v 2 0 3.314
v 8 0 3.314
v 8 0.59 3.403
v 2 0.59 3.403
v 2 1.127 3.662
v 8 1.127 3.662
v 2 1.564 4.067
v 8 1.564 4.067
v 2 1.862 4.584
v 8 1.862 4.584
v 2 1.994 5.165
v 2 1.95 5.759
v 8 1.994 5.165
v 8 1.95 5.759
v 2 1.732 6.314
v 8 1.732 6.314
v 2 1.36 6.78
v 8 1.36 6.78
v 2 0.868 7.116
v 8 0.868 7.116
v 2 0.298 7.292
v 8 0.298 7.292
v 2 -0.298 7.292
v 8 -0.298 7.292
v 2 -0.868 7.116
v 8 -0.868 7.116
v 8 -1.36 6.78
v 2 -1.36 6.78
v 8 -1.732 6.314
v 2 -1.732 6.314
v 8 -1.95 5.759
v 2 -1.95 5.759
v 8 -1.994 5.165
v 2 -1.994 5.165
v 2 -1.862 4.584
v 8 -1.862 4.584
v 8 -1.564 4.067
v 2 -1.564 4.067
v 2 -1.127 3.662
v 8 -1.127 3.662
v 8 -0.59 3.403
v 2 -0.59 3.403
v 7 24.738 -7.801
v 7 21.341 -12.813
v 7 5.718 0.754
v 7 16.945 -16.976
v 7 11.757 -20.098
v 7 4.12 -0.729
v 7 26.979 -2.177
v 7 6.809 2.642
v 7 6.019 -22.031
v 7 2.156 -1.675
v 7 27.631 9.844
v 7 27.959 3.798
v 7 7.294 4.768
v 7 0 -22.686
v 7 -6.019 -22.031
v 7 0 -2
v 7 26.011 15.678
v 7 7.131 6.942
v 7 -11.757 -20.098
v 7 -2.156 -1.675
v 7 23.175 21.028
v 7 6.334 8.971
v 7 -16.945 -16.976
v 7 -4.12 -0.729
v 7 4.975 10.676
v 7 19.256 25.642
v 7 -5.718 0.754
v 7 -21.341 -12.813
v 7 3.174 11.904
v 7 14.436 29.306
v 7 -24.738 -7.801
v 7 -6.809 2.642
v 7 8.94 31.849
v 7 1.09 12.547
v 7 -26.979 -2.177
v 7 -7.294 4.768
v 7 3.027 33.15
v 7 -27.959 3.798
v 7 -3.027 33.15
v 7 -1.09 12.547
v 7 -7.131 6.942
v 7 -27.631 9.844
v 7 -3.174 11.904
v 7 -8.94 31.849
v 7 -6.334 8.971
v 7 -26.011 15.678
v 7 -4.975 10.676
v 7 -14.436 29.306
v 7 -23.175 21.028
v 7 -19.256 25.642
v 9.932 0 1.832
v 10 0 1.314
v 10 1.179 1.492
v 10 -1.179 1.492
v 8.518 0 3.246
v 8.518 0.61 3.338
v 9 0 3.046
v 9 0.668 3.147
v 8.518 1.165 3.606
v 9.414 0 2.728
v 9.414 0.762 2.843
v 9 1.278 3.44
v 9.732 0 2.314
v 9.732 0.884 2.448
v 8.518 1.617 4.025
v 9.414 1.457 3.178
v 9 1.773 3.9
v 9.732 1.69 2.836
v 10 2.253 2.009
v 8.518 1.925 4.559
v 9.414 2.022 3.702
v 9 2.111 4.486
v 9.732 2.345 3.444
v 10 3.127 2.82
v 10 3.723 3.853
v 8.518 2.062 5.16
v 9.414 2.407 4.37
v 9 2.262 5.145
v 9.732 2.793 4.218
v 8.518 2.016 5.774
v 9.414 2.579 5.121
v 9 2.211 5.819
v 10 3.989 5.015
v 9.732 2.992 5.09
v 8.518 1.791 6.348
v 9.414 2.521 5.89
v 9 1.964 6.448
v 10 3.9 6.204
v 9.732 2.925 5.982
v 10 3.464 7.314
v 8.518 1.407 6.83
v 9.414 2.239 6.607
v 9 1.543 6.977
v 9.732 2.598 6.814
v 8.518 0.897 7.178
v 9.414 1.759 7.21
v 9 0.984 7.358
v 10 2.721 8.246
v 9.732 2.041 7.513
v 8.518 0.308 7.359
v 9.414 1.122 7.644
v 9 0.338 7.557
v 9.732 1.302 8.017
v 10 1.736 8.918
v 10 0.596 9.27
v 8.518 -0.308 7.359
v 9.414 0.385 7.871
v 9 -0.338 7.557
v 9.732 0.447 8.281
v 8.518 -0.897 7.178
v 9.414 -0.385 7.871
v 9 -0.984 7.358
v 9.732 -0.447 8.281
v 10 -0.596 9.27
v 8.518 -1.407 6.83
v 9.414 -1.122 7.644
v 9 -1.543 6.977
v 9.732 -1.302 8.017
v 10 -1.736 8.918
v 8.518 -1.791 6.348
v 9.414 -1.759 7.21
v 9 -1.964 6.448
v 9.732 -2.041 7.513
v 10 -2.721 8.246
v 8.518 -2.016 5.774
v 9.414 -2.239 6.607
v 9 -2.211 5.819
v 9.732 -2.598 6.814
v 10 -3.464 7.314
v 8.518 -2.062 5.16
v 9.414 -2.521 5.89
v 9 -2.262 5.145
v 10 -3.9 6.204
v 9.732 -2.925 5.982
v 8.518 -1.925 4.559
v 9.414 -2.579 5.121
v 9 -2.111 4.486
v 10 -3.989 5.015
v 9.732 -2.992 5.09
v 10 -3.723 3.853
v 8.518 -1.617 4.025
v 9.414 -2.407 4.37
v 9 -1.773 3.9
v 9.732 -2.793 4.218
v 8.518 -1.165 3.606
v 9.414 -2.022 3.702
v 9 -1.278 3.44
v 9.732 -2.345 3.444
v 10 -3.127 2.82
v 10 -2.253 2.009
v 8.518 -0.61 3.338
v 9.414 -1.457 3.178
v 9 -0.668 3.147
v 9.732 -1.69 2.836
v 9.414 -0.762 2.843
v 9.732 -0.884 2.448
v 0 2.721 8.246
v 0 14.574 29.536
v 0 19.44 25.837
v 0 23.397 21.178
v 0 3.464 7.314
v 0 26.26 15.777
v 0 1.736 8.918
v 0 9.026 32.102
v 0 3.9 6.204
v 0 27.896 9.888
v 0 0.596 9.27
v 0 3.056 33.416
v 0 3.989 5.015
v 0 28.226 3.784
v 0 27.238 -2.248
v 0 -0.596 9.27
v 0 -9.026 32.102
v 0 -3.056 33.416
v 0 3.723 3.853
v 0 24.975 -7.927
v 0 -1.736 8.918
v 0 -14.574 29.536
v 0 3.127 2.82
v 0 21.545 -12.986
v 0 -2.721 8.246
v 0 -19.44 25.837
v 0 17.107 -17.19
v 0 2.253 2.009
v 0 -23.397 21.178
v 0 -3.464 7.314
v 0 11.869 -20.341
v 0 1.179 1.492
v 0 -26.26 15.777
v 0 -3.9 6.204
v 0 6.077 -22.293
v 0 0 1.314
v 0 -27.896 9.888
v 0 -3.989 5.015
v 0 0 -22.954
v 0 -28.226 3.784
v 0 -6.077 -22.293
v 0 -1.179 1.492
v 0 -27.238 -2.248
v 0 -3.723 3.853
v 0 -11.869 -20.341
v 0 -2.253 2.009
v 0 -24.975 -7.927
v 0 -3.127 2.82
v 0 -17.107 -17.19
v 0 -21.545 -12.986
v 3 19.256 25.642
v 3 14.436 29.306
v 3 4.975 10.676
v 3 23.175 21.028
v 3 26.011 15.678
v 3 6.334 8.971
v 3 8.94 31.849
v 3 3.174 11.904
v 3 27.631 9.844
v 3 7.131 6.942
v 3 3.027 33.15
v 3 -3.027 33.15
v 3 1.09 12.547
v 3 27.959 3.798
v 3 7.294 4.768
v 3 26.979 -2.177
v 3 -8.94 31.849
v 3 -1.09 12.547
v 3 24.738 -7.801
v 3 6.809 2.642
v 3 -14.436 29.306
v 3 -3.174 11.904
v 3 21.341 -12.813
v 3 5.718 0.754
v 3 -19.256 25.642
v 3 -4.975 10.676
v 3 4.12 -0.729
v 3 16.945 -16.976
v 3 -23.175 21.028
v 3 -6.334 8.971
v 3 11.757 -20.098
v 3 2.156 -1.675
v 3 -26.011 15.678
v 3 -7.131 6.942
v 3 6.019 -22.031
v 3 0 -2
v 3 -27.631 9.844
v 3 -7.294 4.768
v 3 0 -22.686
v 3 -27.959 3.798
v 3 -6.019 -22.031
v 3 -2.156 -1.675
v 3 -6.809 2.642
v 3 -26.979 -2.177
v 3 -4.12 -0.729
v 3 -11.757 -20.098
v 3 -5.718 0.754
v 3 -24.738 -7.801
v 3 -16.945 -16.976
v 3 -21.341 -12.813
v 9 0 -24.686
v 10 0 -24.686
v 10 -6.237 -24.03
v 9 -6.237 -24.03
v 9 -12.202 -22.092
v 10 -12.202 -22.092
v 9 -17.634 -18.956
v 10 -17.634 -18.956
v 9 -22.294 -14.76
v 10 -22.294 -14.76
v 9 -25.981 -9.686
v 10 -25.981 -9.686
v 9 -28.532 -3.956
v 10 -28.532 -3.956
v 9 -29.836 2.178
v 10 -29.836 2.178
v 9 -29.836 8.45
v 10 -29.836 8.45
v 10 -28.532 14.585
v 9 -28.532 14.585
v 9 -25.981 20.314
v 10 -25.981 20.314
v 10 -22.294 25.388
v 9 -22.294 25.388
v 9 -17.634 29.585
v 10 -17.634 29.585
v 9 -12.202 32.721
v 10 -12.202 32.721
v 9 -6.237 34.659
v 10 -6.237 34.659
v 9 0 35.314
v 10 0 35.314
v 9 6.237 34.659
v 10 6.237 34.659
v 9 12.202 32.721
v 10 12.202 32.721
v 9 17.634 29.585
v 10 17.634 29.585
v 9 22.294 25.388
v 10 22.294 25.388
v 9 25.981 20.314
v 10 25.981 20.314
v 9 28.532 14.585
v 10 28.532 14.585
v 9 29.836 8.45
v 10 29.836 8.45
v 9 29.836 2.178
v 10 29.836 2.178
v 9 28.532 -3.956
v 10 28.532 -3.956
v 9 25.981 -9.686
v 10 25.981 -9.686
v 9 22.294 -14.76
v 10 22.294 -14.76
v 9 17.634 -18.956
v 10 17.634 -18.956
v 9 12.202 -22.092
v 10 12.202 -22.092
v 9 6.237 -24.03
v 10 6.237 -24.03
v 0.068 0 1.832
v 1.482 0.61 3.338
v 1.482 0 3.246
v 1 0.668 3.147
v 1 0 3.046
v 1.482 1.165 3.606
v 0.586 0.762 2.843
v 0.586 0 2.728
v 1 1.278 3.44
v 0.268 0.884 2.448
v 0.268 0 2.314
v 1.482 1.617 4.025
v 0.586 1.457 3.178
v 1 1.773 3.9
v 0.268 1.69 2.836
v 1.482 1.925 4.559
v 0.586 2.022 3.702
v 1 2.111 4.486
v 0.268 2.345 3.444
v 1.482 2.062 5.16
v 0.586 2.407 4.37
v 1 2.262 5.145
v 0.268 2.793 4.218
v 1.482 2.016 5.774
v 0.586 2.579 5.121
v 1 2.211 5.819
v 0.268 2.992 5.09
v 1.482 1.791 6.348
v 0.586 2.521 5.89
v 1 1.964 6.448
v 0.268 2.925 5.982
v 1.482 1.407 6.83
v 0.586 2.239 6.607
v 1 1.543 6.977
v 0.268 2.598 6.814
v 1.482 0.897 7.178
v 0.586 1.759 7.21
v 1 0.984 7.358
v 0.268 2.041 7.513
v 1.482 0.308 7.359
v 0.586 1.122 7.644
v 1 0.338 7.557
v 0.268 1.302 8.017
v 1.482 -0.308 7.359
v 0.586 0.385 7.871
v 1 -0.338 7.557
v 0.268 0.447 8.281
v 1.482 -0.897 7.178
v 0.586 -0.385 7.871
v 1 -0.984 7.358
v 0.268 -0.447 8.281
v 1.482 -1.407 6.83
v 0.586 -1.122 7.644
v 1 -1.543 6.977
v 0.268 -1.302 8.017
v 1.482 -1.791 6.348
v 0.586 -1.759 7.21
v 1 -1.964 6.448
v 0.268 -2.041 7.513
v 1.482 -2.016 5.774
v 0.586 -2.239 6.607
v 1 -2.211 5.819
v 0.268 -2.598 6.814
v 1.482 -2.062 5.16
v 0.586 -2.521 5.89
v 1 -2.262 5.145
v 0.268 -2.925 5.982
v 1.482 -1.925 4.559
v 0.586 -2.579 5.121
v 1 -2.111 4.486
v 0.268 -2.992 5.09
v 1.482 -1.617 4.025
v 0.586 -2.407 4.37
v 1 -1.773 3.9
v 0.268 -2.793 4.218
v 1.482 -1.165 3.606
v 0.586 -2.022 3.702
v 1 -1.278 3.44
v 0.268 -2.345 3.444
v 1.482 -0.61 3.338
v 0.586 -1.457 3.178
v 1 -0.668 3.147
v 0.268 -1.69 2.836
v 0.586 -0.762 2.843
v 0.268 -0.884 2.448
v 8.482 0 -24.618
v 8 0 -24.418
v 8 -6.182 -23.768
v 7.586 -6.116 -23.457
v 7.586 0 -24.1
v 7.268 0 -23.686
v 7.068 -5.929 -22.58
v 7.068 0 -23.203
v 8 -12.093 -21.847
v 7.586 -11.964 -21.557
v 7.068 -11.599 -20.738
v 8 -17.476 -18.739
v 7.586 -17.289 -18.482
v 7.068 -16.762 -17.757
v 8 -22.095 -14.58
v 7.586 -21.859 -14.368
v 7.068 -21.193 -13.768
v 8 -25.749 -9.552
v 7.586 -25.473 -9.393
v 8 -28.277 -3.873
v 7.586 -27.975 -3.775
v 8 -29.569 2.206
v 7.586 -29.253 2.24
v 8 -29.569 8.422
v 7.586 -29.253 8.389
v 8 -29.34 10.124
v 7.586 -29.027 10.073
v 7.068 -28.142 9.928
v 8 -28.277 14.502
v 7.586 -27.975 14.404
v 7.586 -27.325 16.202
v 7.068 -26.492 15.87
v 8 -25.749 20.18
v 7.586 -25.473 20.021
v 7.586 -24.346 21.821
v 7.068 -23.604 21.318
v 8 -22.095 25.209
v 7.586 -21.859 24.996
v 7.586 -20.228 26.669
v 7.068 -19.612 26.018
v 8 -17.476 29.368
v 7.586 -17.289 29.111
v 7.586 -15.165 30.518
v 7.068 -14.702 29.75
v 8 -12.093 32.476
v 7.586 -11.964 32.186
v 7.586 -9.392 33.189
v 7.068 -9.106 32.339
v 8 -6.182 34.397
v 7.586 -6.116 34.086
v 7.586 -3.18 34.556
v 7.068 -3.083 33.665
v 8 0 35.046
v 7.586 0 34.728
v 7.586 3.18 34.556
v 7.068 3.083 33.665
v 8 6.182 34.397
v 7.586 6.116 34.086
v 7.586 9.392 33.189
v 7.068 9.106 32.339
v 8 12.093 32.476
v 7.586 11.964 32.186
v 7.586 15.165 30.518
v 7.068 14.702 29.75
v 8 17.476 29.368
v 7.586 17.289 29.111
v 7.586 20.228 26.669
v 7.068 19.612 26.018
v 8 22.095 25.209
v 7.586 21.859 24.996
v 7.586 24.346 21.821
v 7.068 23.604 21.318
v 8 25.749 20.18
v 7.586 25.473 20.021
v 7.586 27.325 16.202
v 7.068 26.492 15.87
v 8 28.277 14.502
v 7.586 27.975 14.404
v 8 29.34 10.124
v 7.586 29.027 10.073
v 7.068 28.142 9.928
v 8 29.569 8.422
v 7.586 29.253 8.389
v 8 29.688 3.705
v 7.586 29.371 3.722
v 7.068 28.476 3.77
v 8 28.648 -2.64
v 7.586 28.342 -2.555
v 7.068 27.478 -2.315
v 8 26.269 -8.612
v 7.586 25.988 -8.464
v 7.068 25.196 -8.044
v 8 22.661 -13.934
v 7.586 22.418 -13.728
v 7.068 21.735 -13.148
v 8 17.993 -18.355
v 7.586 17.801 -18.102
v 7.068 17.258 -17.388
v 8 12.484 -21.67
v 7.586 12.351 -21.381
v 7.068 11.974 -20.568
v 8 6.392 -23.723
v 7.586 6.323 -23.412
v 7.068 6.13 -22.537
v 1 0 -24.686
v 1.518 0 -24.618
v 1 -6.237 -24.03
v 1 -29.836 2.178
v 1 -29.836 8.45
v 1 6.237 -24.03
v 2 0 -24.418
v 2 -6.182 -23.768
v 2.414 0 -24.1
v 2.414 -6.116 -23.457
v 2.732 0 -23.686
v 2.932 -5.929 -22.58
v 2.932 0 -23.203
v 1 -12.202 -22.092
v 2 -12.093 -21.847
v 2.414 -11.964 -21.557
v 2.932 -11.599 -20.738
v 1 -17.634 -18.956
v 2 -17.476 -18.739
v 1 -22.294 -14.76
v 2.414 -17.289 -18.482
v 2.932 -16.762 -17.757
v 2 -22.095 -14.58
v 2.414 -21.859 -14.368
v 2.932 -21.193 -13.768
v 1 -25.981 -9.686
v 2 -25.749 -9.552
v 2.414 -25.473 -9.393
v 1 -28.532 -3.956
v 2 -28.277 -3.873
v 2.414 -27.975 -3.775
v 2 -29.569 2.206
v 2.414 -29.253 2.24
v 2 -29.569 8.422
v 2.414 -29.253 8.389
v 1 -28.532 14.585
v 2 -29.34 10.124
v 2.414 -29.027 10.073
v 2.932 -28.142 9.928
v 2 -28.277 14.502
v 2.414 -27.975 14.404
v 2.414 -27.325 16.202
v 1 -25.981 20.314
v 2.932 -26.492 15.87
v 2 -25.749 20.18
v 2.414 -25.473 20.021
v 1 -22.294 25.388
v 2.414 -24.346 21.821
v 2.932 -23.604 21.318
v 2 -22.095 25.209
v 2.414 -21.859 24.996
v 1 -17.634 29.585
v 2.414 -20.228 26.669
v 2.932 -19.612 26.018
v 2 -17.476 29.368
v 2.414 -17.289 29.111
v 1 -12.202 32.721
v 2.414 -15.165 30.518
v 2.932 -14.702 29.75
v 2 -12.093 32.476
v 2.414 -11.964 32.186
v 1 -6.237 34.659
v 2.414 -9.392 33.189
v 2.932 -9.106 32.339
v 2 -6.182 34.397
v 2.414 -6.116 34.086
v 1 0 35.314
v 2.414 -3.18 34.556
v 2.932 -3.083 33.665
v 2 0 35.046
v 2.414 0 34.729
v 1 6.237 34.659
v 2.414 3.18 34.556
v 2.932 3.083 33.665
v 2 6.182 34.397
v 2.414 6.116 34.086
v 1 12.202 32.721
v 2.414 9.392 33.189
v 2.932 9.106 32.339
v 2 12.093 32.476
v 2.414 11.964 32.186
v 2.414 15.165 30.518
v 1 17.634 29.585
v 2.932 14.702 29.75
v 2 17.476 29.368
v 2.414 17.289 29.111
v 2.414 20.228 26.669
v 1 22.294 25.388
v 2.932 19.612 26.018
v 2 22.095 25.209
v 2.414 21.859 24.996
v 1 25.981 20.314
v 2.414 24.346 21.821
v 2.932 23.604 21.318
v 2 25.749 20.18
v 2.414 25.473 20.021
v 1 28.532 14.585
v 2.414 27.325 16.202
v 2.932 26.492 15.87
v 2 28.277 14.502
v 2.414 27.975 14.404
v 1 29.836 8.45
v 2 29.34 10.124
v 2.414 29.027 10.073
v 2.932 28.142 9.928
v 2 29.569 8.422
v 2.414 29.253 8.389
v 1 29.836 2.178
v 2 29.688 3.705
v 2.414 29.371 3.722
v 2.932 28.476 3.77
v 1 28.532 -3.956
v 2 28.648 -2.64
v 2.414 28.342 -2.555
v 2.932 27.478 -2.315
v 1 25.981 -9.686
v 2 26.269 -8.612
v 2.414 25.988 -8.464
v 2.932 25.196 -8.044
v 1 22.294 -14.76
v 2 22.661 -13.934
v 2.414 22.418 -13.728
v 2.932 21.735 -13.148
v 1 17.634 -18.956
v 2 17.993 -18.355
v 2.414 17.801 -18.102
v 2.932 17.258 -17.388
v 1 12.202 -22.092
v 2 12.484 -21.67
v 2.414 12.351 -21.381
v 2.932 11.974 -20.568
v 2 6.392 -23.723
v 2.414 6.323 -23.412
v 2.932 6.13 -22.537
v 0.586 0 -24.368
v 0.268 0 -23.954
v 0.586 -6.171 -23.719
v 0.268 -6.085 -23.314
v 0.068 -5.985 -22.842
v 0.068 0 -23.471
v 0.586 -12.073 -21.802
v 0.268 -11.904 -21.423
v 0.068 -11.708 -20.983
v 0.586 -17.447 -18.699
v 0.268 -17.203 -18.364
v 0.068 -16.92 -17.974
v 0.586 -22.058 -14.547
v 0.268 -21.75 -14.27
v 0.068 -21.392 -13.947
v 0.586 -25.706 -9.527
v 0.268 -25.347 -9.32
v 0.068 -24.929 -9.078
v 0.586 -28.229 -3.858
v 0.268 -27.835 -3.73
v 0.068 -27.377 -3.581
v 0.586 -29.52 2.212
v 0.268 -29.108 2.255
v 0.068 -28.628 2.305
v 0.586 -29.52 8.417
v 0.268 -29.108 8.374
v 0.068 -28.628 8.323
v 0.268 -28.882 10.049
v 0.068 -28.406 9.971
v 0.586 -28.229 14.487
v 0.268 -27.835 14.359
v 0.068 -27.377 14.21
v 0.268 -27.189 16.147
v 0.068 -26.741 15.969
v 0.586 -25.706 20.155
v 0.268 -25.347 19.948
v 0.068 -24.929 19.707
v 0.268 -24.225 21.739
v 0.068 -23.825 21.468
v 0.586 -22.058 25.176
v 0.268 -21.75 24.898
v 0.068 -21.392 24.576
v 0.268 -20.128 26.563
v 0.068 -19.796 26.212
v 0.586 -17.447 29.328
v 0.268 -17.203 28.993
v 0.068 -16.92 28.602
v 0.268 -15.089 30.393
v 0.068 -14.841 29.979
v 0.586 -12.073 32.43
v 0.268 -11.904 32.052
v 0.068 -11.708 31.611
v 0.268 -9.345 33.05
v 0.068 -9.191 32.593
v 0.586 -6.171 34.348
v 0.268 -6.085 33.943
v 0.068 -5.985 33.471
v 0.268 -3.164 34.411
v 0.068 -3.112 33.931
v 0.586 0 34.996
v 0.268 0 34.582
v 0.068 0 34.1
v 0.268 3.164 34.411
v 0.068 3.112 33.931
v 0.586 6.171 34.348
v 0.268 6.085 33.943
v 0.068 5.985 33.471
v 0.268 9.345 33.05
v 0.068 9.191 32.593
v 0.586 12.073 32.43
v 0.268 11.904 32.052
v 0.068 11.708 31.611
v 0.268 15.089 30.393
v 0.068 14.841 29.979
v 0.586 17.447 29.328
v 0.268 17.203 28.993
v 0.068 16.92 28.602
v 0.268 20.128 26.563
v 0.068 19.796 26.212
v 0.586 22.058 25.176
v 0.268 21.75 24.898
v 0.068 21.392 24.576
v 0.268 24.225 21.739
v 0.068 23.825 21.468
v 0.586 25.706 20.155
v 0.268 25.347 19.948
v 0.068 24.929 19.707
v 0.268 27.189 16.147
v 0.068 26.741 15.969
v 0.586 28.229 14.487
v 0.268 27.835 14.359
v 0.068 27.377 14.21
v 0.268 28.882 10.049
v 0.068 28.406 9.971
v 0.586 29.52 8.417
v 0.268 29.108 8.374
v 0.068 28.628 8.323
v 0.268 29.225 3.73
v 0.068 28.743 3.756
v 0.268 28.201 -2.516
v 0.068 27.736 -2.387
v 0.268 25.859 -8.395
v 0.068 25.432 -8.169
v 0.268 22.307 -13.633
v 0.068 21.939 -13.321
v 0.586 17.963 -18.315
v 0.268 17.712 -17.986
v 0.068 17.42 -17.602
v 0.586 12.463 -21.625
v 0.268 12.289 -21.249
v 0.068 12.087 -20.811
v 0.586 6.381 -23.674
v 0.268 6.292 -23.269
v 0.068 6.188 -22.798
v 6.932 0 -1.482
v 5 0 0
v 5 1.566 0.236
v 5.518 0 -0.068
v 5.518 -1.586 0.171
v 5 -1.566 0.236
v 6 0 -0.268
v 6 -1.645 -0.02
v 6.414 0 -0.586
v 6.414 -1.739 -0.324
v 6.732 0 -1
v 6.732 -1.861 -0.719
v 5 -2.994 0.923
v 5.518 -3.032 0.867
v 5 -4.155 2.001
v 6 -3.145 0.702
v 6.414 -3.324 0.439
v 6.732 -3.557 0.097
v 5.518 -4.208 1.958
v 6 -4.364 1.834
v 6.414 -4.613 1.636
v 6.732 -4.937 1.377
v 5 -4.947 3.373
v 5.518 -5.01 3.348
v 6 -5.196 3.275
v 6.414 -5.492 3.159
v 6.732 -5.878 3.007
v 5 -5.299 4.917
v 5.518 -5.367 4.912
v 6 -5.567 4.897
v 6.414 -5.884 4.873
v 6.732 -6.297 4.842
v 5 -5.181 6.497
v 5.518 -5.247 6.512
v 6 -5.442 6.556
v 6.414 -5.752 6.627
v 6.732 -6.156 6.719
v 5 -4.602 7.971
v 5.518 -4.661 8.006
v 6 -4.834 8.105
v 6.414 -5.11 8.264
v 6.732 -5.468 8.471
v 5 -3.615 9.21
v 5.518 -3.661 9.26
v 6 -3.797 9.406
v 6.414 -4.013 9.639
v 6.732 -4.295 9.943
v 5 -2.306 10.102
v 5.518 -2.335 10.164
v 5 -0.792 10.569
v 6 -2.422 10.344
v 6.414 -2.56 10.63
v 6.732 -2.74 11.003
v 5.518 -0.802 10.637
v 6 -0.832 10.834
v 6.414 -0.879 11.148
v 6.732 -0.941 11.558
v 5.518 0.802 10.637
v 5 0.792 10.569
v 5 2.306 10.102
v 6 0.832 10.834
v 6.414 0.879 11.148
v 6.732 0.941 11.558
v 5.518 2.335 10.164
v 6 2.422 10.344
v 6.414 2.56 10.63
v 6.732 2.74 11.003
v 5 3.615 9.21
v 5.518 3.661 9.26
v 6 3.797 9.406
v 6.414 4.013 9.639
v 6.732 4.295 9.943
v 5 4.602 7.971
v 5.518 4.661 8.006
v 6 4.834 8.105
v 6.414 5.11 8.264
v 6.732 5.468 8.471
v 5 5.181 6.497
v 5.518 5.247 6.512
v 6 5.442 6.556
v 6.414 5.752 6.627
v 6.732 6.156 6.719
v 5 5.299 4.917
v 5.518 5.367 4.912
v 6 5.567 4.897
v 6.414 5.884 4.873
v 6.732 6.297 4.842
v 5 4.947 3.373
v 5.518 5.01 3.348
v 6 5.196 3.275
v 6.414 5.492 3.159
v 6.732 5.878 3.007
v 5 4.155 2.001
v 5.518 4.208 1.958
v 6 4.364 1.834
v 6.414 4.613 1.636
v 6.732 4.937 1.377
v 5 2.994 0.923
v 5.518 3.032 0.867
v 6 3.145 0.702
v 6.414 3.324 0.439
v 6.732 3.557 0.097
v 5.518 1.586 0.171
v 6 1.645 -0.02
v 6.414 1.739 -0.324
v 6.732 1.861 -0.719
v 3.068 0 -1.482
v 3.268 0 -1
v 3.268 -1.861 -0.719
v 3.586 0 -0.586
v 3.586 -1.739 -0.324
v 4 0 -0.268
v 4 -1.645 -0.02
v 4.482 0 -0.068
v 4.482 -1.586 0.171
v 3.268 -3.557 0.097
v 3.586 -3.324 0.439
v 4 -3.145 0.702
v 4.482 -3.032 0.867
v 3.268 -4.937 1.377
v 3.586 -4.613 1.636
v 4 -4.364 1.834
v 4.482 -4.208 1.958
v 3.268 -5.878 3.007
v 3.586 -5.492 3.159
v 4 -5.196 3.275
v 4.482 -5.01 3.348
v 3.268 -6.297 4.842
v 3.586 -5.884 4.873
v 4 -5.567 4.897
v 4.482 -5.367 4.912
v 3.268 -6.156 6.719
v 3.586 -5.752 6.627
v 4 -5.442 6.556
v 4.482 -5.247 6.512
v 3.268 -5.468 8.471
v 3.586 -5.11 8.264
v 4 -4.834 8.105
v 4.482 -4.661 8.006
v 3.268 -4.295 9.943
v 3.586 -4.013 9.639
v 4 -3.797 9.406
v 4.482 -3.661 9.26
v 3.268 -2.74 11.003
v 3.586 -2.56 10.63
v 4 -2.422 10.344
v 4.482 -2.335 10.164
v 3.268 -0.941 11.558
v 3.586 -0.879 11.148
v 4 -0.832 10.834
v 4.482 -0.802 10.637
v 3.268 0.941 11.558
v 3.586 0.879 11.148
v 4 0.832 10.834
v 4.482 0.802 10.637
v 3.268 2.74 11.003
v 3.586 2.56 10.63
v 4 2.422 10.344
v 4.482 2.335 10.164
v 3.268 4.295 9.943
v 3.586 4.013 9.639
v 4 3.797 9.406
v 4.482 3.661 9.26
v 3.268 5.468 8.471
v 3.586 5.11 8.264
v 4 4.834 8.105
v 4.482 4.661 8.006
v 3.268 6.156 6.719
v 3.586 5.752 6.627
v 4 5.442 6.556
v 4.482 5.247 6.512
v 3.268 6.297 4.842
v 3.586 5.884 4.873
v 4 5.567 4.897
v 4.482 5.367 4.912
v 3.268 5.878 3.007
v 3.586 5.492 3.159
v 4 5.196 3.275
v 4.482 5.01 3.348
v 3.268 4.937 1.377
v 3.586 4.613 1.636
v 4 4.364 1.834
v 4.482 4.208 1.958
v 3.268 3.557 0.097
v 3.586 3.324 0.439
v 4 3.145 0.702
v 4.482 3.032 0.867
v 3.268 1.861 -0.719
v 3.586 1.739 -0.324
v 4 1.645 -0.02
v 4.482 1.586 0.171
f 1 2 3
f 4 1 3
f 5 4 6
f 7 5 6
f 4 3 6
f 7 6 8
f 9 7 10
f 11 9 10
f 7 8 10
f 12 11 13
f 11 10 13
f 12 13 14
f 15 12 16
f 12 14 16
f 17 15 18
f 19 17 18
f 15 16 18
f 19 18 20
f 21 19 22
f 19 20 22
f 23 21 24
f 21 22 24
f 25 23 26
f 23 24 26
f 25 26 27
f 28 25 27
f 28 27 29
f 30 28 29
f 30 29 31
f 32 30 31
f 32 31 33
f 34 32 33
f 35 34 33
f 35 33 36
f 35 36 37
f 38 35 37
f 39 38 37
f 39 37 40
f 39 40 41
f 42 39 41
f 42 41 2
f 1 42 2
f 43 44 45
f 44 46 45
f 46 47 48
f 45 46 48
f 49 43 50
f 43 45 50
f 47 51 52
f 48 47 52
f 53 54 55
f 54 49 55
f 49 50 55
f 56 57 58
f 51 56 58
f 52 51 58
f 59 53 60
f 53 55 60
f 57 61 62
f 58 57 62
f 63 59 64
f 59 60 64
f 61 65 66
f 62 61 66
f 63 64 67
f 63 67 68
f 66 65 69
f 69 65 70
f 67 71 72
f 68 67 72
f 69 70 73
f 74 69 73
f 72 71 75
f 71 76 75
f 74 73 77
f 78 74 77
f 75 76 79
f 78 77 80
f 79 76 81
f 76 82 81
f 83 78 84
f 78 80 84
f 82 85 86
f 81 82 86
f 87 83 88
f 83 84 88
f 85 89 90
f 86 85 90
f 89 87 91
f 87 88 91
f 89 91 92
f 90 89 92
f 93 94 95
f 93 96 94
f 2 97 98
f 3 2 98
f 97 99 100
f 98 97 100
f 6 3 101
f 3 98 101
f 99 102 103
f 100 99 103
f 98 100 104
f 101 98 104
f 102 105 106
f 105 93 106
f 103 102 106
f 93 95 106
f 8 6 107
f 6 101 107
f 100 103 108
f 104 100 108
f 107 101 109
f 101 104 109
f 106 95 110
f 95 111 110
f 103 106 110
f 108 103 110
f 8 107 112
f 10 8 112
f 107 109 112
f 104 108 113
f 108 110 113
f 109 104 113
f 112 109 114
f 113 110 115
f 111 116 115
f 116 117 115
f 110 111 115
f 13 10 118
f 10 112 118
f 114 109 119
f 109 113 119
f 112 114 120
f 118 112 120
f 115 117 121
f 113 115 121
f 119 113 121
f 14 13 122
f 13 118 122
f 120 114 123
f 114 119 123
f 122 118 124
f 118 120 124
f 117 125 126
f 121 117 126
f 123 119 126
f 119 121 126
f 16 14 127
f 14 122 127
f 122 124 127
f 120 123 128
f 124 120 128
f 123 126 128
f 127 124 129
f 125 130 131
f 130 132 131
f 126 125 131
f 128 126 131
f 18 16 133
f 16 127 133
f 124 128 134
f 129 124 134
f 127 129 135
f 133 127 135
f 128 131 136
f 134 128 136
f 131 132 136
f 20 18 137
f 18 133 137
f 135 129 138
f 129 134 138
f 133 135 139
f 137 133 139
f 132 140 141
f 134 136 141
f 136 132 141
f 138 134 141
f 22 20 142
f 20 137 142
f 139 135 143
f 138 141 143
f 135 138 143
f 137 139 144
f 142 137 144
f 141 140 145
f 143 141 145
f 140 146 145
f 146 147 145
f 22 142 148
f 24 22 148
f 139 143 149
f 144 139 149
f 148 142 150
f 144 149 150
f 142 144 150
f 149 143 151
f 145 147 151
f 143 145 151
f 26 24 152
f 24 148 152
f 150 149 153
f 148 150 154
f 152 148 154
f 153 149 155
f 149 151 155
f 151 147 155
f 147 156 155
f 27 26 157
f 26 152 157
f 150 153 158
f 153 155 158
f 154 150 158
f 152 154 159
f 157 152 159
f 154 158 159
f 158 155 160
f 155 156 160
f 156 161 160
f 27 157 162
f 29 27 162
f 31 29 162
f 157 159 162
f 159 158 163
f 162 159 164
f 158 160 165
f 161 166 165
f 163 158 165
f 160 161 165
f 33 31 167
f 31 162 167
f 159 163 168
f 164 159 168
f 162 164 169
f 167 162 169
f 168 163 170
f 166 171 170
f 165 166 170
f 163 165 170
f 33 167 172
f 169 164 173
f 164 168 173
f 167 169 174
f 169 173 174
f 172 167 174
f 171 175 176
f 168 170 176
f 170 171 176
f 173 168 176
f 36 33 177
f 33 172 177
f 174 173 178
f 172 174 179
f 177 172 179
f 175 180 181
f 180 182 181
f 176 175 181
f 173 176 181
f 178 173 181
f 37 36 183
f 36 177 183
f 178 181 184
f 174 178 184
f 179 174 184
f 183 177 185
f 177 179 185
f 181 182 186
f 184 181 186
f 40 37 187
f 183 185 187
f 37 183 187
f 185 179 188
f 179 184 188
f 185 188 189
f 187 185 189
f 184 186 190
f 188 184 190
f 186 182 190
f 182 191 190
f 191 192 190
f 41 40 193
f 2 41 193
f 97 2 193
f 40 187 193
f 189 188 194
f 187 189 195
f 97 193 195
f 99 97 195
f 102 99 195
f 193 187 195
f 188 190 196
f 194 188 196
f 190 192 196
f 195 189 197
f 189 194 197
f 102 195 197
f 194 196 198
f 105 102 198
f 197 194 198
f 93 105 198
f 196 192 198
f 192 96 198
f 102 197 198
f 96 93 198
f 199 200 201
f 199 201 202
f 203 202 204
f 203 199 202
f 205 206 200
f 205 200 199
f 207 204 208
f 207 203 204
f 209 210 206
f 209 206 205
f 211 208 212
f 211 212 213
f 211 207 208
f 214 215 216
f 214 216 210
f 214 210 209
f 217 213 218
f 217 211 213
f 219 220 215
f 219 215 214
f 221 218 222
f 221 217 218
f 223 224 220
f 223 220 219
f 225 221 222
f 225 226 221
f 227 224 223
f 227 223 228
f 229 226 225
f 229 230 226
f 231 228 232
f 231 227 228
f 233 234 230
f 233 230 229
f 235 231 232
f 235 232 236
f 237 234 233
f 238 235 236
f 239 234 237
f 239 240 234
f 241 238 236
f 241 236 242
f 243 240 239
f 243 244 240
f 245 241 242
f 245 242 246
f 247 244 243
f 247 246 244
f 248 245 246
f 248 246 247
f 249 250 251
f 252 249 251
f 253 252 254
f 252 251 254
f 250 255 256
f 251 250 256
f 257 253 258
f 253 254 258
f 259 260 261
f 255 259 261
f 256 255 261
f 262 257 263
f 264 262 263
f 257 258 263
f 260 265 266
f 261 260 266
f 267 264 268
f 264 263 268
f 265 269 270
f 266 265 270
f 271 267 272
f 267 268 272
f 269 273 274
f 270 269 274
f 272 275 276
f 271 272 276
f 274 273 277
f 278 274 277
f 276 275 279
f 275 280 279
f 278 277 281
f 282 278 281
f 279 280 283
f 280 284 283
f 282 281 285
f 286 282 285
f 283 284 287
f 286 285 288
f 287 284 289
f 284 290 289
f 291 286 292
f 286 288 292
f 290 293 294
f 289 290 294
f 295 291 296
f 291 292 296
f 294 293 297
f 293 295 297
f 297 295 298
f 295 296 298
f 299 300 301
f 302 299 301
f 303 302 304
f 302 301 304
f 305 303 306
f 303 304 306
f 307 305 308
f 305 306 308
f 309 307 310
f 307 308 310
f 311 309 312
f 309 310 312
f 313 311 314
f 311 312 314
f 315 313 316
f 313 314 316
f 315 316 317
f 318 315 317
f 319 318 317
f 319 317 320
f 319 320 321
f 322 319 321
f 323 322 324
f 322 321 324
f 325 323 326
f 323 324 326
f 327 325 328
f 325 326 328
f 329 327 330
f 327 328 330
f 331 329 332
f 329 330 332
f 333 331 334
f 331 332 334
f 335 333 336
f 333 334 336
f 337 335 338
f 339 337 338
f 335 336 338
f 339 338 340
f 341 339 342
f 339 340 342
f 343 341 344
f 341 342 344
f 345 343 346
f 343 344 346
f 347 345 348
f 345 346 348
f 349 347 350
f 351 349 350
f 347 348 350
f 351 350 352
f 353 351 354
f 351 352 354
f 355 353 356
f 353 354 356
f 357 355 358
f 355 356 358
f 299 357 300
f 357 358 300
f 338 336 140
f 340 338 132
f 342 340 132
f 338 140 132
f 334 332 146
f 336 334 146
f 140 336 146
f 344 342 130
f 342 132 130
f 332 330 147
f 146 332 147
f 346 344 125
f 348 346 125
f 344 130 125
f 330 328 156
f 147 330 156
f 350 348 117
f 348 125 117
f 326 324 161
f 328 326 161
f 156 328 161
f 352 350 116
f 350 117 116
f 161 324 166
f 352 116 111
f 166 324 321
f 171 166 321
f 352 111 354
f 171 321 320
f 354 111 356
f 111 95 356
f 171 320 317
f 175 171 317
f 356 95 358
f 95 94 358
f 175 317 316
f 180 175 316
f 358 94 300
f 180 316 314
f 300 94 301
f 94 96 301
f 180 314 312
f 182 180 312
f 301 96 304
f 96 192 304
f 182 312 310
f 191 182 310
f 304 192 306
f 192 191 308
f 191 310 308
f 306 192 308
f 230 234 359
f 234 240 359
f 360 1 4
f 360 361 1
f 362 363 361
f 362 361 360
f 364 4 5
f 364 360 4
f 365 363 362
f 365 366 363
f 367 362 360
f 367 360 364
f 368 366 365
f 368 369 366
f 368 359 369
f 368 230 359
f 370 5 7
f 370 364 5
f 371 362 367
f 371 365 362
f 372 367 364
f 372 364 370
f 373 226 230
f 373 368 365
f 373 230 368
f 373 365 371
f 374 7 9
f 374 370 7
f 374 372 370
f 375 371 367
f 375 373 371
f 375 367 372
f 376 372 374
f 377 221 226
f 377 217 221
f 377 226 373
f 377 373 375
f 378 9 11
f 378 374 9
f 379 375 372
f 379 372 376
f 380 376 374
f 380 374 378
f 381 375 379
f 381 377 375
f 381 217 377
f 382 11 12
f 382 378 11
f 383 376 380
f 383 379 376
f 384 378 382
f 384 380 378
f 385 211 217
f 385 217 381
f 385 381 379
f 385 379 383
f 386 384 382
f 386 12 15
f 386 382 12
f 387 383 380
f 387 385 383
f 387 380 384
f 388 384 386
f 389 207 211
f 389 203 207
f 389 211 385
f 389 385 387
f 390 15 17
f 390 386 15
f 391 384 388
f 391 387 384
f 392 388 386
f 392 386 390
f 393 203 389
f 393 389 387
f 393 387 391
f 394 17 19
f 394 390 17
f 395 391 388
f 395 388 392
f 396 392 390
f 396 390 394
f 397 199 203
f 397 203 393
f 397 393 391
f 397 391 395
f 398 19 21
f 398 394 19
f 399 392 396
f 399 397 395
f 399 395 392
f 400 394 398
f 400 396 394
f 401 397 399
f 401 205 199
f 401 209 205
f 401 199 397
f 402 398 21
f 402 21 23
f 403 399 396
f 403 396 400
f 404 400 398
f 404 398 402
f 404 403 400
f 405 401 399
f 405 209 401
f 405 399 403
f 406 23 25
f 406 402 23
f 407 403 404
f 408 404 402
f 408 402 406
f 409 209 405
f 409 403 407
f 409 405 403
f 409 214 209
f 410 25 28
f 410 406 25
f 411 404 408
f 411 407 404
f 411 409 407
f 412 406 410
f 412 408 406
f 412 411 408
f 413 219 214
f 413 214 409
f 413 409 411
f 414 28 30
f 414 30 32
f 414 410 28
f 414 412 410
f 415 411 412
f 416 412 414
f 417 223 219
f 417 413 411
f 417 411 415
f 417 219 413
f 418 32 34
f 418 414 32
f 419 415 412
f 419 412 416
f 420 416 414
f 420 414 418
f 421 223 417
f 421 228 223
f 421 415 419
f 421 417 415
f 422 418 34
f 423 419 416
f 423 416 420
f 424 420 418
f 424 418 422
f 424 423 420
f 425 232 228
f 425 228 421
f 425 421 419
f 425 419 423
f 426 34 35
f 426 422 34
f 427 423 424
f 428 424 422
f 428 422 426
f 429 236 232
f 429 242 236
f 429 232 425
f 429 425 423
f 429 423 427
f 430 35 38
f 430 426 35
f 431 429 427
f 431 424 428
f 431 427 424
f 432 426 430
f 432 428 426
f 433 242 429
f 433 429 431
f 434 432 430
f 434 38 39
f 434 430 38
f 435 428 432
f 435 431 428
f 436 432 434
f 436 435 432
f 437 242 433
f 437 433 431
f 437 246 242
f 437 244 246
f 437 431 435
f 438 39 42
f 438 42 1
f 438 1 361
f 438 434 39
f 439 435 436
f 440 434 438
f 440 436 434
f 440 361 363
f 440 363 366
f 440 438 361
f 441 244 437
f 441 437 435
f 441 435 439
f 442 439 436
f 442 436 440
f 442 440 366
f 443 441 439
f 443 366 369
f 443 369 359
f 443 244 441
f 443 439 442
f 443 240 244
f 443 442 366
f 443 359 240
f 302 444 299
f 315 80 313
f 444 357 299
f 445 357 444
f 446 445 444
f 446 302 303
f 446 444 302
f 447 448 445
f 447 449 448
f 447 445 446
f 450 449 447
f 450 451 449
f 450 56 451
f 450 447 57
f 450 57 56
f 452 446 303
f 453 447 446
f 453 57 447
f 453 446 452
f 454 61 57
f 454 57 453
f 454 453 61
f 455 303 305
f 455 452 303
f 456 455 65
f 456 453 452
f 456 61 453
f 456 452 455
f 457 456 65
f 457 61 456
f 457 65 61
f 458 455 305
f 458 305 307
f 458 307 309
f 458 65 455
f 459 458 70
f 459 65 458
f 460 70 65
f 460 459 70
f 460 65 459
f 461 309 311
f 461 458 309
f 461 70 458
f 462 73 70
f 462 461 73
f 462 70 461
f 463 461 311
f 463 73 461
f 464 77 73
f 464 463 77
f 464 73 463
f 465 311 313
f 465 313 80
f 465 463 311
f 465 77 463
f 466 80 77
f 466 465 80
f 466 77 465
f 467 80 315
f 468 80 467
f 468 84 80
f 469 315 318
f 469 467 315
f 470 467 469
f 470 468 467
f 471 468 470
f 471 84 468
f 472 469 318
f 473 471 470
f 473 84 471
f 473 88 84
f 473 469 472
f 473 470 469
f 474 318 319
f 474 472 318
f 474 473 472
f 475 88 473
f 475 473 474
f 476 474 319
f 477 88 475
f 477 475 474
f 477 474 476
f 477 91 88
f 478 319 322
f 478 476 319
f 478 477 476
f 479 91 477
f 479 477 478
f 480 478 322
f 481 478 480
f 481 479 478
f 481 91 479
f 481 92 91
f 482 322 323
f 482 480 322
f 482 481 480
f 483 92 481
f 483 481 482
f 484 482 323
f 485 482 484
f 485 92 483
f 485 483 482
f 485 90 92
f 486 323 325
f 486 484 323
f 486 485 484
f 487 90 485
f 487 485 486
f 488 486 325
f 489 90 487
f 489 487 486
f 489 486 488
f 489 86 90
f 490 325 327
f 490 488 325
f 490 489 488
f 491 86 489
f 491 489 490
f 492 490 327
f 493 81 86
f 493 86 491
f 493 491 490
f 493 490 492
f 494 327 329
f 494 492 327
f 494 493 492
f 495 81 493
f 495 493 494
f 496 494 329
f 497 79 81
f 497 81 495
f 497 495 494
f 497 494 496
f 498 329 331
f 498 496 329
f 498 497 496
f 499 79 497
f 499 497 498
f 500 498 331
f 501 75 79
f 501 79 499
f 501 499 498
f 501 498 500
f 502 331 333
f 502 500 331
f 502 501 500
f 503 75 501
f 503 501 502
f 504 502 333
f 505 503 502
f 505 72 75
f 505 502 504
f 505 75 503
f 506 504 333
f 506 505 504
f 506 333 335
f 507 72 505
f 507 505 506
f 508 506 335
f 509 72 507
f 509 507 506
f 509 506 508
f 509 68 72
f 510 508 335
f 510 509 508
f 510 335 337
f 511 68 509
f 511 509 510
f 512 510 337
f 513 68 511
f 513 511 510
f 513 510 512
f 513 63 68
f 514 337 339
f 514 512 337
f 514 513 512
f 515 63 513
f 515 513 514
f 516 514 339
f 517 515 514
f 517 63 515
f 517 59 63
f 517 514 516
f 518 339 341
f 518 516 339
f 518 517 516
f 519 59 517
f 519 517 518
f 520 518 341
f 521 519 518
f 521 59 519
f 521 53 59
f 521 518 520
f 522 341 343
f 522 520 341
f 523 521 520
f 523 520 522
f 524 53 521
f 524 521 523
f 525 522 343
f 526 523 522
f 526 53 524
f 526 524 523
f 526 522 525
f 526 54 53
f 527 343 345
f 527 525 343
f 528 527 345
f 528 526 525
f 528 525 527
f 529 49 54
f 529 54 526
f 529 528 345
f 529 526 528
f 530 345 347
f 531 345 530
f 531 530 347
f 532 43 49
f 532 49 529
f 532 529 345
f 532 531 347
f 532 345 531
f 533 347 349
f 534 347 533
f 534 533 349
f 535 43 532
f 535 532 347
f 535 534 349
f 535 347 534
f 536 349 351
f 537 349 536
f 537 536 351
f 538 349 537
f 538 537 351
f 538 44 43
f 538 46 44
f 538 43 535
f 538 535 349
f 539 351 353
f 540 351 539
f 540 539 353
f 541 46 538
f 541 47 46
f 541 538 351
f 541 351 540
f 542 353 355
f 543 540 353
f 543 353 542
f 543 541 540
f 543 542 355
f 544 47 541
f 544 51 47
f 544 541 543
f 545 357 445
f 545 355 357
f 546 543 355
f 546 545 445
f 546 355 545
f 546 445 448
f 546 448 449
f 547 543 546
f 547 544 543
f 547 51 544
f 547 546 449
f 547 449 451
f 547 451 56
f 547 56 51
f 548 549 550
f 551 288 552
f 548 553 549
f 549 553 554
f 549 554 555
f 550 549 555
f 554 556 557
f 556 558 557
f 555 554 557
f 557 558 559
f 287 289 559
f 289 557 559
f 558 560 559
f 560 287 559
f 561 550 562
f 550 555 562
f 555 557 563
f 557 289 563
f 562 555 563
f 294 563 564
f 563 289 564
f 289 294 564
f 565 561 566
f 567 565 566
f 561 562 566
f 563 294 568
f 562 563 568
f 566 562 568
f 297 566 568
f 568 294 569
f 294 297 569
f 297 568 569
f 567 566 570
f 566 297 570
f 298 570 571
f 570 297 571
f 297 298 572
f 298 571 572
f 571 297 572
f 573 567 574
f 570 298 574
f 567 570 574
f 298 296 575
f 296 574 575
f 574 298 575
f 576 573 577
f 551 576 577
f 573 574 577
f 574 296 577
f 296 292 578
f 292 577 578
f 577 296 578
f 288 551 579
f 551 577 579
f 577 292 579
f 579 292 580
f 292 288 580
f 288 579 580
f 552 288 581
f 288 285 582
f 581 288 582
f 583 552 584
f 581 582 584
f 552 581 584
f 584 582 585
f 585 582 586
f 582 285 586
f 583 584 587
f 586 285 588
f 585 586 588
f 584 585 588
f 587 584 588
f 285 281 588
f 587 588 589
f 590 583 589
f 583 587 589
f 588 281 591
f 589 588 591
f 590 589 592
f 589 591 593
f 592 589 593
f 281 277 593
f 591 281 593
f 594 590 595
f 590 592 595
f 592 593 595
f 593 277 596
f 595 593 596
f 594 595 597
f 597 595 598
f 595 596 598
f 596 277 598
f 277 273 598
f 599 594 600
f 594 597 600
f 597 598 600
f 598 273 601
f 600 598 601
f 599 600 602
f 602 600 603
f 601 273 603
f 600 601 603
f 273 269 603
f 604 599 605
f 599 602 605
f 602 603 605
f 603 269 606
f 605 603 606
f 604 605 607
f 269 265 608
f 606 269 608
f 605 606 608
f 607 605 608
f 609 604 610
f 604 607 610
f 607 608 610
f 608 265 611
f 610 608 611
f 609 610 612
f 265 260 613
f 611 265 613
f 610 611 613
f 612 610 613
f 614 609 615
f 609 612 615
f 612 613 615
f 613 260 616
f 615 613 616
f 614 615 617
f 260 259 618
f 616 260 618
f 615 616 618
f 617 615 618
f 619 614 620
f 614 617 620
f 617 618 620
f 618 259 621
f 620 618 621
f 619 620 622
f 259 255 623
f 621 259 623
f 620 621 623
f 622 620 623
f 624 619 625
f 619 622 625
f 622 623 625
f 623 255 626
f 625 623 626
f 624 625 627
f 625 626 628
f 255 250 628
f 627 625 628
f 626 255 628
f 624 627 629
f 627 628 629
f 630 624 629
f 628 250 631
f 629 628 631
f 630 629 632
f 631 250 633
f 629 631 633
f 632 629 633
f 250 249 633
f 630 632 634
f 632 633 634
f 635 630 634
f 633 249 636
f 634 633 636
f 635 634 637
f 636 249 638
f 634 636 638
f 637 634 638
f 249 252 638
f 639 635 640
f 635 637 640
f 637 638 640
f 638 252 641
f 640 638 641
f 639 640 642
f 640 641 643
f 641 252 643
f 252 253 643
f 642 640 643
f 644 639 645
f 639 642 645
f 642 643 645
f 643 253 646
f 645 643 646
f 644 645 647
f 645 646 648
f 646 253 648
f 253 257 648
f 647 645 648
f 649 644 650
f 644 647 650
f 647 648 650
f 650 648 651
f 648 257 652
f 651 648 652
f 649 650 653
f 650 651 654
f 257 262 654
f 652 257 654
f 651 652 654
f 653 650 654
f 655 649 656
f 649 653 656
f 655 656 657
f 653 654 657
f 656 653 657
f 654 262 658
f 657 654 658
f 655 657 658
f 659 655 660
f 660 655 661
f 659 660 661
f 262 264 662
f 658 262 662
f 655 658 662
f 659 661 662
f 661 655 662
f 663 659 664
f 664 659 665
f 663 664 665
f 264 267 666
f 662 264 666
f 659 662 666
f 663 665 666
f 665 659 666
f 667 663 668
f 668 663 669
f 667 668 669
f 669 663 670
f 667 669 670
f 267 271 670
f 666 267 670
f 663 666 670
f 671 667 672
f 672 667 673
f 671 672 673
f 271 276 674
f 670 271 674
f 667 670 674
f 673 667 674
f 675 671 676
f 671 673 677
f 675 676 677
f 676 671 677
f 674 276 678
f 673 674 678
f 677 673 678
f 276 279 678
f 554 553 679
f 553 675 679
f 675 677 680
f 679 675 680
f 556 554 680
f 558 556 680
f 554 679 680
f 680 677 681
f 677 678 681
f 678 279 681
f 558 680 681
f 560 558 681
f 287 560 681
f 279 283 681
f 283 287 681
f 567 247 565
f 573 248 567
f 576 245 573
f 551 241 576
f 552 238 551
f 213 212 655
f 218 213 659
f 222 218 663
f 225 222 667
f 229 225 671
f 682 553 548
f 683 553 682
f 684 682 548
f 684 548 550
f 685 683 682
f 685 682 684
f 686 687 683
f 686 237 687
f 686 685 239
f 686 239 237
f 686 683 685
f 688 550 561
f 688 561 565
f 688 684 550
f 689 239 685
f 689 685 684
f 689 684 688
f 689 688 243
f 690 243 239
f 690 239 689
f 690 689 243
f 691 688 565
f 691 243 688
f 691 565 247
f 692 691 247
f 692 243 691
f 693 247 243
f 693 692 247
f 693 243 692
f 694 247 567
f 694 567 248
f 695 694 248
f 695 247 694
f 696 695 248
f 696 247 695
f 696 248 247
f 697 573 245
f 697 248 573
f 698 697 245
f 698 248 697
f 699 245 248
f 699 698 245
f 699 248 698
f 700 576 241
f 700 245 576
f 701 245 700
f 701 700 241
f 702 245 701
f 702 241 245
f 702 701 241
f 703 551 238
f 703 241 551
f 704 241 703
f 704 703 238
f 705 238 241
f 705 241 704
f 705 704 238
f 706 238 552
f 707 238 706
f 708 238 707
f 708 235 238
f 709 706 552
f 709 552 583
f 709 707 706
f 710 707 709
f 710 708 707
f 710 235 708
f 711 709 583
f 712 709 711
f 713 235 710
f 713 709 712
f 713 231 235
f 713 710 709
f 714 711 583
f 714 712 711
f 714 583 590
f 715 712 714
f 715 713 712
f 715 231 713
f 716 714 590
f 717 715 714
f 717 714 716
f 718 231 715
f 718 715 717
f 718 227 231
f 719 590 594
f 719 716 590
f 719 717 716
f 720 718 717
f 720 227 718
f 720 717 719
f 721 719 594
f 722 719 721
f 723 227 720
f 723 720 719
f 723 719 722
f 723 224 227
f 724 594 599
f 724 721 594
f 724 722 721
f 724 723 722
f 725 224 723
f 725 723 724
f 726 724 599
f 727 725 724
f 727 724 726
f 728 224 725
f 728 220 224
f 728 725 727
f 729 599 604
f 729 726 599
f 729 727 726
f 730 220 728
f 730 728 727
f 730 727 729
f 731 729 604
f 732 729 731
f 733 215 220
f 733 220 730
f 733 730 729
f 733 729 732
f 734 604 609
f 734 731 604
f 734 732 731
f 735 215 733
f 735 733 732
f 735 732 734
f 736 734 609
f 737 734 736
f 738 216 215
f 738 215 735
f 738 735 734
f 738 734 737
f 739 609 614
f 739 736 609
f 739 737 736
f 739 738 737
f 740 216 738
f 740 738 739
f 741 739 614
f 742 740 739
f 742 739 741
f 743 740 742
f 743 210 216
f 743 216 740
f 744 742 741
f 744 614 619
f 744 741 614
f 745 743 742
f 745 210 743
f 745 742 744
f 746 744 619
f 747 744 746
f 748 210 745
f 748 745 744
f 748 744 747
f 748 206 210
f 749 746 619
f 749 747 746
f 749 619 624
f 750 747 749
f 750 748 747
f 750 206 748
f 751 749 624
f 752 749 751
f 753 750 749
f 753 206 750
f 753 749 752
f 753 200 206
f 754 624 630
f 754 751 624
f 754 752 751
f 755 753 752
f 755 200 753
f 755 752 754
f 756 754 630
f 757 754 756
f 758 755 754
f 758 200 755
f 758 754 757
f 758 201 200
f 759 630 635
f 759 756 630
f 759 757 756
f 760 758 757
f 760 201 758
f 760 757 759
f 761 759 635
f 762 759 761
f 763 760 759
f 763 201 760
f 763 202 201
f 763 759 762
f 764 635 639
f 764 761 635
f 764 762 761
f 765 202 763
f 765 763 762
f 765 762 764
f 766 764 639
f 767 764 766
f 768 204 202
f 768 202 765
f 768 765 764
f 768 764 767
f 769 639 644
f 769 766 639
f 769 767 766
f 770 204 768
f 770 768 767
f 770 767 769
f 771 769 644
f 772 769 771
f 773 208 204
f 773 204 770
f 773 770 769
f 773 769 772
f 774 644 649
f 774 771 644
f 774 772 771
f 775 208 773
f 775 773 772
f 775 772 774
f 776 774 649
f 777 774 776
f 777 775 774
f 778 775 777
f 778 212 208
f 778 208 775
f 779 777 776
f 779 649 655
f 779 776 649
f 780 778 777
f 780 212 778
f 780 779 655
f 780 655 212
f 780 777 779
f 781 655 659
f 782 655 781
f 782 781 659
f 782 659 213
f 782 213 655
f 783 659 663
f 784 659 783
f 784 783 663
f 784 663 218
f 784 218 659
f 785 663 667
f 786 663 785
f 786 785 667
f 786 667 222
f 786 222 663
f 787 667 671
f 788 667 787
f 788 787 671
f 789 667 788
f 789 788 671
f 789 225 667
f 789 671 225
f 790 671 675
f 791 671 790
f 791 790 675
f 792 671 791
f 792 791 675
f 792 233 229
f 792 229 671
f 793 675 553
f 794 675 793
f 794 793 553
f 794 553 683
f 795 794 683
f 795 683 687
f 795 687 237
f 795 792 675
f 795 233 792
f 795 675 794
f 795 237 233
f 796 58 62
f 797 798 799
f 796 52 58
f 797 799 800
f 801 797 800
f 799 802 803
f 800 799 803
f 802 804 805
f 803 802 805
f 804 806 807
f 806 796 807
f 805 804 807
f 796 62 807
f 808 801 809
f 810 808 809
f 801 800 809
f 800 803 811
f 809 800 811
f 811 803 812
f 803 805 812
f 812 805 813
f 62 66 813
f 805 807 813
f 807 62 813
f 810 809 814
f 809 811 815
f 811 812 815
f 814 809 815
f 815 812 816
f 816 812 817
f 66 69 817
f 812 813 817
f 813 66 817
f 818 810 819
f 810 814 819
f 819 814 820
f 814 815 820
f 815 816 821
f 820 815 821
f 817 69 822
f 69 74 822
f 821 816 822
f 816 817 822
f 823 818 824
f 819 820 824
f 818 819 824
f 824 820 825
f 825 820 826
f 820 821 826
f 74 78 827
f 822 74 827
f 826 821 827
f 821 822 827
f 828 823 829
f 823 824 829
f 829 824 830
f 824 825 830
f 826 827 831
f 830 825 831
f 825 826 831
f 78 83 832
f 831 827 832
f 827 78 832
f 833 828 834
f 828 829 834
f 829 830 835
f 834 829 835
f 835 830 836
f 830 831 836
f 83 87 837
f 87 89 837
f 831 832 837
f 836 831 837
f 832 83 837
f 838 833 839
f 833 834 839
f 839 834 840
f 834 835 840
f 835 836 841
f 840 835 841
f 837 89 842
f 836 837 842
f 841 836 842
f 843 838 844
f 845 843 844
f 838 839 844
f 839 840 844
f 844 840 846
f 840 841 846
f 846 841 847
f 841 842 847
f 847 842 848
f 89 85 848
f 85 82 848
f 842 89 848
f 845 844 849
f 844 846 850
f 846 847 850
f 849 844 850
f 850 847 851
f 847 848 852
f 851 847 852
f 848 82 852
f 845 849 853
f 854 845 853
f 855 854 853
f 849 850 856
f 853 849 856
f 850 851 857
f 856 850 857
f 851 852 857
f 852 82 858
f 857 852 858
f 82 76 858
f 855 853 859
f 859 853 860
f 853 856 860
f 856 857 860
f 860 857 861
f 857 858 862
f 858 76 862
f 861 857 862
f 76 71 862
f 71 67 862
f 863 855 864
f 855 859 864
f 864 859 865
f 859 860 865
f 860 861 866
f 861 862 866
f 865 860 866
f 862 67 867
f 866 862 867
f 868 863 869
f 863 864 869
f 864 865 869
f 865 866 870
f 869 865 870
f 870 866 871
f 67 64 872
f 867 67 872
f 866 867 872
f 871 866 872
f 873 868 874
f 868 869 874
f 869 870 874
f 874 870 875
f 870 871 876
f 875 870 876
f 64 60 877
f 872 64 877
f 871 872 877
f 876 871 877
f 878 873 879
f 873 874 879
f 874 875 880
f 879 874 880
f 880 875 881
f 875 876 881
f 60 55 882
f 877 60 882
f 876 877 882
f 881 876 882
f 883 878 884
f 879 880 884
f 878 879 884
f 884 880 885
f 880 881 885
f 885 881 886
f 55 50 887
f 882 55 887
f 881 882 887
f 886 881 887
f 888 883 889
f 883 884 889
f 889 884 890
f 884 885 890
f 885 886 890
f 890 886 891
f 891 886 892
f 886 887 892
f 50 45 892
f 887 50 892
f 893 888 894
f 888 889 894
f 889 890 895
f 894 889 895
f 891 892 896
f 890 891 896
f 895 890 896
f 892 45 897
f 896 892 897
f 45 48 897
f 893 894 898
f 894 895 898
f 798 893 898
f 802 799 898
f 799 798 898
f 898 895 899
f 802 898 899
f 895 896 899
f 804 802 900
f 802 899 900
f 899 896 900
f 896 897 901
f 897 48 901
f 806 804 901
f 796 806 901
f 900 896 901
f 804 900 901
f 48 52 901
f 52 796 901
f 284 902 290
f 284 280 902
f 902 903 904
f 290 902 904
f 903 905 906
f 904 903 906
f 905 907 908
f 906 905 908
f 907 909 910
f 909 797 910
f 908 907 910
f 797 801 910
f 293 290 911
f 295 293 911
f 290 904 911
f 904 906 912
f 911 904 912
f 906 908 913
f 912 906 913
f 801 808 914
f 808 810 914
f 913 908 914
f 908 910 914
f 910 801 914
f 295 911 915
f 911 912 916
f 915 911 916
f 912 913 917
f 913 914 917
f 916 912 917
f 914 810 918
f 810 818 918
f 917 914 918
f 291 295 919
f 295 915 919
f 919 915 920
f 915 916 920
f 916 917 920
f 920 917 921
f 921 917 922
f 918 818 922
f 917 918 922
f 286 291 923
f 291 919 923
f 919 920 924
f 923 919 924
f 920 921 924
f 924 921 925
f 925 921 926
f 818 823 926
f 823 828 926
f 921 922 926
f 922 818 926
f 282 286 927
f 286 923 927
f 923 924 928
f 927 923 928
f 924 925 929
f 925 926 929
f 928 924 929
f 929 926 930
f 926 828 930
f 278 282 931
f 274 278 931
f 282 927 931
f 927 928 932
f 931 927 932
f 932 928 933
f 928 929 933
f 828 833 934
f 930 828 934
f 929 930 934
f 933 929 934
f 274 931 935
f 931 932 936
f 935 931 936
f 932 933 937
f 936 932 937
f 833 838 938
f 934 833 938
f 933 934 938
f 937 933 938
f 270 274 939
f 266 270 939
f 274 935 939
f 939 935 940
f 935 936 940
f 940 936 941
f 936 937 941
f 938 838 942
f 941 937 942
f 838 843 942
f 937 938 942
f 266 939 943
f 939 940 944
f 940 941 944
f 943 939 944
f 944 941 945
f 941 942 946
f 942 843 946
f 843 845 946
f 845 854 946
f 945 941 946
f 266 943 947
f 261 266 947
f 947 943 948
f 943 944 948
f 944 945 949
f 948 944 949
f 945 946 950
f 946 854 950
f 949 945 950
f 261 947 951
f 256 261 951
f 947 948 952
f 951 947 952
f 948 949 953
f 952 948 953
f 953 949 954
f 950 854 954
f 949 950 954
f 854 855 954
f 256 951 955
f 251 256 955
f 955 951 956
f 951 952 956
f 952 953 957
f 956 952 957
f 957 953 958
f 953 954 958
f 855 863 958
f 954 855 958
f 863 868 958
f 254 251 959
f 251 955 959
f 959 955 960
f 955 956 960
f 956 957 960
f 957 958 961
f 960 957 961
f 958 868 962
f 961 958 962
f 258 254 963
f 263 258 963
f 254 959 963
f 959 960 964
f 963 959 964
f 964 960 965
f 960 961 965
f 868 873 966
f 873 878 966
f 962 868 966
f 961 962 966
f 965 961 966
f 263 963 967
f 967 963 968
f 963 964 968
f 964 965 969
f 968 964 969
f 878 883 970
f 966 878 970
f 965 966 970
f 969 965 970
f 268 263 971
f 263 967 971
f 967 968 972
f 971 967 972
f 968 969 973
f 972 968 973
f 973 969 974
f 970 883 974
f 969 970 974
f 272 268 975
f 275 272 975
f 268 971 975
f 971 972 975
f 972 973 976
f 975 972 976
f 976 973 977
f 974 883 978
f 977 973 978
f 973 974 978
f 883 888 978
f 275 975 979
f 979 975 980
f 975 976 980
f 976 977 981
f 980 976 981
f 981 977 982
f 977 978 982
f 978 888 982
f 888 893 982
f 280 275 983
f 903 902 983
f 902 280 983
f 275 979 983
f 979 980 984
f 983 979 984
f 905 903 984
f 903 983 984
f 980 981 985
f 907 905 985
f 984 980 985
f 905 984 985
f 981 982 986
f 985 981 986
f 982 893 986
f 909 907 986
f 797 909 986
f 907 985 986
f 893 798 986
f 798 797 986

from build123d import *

# Parameters (mm, degrees)
SKETCH2_R          = 2
CUT_EXTRUDE1_DEPTH = 10
FILLET1_R          = 2
FILLET2_R          = 2
FILLET3_R          = 2


# Some blends are built 0.0001 mm under size
with BuildPart() as part:
    # Sketch1 → Revolve1 (revolve)
    with BuildSketch(Plane(origin=(0, 0, 0), x_dir=(1, 0, 0), z_dir=(0, 1, 0))):
        Polygon((0, 0), (0, 24.685714286), (3, 24.685714286), (3, 0), (7, 0), (7, 24.685714286), (10, 24.685714286), (10, -5.314285714), (0, -5.314285714), align=None)
    revolve(axis=Axis((10, 0, 5.314285714), (-1, 0, 0)))

    # Sketch2 → Cut-Extrude1 (cut)
    with BuildSketch(Plane(origin=(10, 0, 0), x_dir=(0, 0, -1), z_dir=(1, 0, 0))):
        with Locations((-5.314285714, 0)):
            Circle(SKETCH2_R)
    extrude(amount=-CUT_EXTRUDE1_DEPTH, mode=Mode.SUBTRACT)

    # Fillet1
    fillet1_edges = [part.edges().sort_by_distance(p)[0] for p in [
        (7, 0, 10.628571429),
        (3, 0, 10.628571429),
        (3, 0, 35.314285714),
    ]]
    fillet(fillet1_edges, radius=FILLET1_R - 0.0001)  # a hair under: the kernel refuses the full size

    # Fillet2
    fillet2_edges = [part.edges().sort_by_distance(p)[0] for p in [
        (10, 0, 7.314285714),
        (7, 0, 35.314285714),
    ]]
    fillet(fillet2_edges, radius=FILLET2_R)

    # Fillet3
    # the kernel refuses this fillet: 2 mm, written as the material it takes off along each edge
    with BuildSketch(Plane(origin=(0, 0, 5.314285714), x_dir=(0, 0, -1), z_dir=(0, -1, 0))) as fillet3_piece_1:
        with BuildLine():
            CenterArc((2 + FILLET3_R, FILLET3_R), FILLET3_R, 180, 90)
            Line((2 + FILLET3_R, 0), (2 + FILLET3_R, -FILLET3_R * 0.02))
            Line((2 + FILLET3_R, -FILLET3_R * 0.02), (2 - FILLET3_R * 0.02, -FILLET3_R * 0.02))
            Line((2 - FILLET3_R * 0.02, -FILLET3_R * 0.02), (2 - FILLET3_R * 0.02, FILLET3_R))
            Line((2 - FILLET3_R * 0.02, FILLET3_R), (2, FILLET3_R))
        make_face()
    revolve(axis=Axis((0, 0, 5.314285714), (1, 0, 0)), mode=Mode.SUBTRACT)
    with BuildSketch(Plane(origin=(0, 0, 5.314285714), x_dir=(0, 0, -1), z_dir=(0, 1, 0))) as fillet3_piece_2:
        with BuildLine():
            CenterArc((28.267891461, -2), FILLET3_R, 29.996692082, 60.003307918)
            Line((30, -1.0001), (30.034642171, -0.980102))
            ThreePointArc((30.034642171, -0.980102), (30.04, -0.50005), (30.04, 0))
            Line((30.04, 0), (30, 0.04))
            Line((30, 0.04), (28.267891461, 0.04))
            Line((28.267891461, 0.04), (28.267891461, 0))
        make_face()
    revolve(axis=Axis((0, 0, 5.314285714), (-1, 0, 0)), mode=Mode.SUBTRACT)


solid = part.part
